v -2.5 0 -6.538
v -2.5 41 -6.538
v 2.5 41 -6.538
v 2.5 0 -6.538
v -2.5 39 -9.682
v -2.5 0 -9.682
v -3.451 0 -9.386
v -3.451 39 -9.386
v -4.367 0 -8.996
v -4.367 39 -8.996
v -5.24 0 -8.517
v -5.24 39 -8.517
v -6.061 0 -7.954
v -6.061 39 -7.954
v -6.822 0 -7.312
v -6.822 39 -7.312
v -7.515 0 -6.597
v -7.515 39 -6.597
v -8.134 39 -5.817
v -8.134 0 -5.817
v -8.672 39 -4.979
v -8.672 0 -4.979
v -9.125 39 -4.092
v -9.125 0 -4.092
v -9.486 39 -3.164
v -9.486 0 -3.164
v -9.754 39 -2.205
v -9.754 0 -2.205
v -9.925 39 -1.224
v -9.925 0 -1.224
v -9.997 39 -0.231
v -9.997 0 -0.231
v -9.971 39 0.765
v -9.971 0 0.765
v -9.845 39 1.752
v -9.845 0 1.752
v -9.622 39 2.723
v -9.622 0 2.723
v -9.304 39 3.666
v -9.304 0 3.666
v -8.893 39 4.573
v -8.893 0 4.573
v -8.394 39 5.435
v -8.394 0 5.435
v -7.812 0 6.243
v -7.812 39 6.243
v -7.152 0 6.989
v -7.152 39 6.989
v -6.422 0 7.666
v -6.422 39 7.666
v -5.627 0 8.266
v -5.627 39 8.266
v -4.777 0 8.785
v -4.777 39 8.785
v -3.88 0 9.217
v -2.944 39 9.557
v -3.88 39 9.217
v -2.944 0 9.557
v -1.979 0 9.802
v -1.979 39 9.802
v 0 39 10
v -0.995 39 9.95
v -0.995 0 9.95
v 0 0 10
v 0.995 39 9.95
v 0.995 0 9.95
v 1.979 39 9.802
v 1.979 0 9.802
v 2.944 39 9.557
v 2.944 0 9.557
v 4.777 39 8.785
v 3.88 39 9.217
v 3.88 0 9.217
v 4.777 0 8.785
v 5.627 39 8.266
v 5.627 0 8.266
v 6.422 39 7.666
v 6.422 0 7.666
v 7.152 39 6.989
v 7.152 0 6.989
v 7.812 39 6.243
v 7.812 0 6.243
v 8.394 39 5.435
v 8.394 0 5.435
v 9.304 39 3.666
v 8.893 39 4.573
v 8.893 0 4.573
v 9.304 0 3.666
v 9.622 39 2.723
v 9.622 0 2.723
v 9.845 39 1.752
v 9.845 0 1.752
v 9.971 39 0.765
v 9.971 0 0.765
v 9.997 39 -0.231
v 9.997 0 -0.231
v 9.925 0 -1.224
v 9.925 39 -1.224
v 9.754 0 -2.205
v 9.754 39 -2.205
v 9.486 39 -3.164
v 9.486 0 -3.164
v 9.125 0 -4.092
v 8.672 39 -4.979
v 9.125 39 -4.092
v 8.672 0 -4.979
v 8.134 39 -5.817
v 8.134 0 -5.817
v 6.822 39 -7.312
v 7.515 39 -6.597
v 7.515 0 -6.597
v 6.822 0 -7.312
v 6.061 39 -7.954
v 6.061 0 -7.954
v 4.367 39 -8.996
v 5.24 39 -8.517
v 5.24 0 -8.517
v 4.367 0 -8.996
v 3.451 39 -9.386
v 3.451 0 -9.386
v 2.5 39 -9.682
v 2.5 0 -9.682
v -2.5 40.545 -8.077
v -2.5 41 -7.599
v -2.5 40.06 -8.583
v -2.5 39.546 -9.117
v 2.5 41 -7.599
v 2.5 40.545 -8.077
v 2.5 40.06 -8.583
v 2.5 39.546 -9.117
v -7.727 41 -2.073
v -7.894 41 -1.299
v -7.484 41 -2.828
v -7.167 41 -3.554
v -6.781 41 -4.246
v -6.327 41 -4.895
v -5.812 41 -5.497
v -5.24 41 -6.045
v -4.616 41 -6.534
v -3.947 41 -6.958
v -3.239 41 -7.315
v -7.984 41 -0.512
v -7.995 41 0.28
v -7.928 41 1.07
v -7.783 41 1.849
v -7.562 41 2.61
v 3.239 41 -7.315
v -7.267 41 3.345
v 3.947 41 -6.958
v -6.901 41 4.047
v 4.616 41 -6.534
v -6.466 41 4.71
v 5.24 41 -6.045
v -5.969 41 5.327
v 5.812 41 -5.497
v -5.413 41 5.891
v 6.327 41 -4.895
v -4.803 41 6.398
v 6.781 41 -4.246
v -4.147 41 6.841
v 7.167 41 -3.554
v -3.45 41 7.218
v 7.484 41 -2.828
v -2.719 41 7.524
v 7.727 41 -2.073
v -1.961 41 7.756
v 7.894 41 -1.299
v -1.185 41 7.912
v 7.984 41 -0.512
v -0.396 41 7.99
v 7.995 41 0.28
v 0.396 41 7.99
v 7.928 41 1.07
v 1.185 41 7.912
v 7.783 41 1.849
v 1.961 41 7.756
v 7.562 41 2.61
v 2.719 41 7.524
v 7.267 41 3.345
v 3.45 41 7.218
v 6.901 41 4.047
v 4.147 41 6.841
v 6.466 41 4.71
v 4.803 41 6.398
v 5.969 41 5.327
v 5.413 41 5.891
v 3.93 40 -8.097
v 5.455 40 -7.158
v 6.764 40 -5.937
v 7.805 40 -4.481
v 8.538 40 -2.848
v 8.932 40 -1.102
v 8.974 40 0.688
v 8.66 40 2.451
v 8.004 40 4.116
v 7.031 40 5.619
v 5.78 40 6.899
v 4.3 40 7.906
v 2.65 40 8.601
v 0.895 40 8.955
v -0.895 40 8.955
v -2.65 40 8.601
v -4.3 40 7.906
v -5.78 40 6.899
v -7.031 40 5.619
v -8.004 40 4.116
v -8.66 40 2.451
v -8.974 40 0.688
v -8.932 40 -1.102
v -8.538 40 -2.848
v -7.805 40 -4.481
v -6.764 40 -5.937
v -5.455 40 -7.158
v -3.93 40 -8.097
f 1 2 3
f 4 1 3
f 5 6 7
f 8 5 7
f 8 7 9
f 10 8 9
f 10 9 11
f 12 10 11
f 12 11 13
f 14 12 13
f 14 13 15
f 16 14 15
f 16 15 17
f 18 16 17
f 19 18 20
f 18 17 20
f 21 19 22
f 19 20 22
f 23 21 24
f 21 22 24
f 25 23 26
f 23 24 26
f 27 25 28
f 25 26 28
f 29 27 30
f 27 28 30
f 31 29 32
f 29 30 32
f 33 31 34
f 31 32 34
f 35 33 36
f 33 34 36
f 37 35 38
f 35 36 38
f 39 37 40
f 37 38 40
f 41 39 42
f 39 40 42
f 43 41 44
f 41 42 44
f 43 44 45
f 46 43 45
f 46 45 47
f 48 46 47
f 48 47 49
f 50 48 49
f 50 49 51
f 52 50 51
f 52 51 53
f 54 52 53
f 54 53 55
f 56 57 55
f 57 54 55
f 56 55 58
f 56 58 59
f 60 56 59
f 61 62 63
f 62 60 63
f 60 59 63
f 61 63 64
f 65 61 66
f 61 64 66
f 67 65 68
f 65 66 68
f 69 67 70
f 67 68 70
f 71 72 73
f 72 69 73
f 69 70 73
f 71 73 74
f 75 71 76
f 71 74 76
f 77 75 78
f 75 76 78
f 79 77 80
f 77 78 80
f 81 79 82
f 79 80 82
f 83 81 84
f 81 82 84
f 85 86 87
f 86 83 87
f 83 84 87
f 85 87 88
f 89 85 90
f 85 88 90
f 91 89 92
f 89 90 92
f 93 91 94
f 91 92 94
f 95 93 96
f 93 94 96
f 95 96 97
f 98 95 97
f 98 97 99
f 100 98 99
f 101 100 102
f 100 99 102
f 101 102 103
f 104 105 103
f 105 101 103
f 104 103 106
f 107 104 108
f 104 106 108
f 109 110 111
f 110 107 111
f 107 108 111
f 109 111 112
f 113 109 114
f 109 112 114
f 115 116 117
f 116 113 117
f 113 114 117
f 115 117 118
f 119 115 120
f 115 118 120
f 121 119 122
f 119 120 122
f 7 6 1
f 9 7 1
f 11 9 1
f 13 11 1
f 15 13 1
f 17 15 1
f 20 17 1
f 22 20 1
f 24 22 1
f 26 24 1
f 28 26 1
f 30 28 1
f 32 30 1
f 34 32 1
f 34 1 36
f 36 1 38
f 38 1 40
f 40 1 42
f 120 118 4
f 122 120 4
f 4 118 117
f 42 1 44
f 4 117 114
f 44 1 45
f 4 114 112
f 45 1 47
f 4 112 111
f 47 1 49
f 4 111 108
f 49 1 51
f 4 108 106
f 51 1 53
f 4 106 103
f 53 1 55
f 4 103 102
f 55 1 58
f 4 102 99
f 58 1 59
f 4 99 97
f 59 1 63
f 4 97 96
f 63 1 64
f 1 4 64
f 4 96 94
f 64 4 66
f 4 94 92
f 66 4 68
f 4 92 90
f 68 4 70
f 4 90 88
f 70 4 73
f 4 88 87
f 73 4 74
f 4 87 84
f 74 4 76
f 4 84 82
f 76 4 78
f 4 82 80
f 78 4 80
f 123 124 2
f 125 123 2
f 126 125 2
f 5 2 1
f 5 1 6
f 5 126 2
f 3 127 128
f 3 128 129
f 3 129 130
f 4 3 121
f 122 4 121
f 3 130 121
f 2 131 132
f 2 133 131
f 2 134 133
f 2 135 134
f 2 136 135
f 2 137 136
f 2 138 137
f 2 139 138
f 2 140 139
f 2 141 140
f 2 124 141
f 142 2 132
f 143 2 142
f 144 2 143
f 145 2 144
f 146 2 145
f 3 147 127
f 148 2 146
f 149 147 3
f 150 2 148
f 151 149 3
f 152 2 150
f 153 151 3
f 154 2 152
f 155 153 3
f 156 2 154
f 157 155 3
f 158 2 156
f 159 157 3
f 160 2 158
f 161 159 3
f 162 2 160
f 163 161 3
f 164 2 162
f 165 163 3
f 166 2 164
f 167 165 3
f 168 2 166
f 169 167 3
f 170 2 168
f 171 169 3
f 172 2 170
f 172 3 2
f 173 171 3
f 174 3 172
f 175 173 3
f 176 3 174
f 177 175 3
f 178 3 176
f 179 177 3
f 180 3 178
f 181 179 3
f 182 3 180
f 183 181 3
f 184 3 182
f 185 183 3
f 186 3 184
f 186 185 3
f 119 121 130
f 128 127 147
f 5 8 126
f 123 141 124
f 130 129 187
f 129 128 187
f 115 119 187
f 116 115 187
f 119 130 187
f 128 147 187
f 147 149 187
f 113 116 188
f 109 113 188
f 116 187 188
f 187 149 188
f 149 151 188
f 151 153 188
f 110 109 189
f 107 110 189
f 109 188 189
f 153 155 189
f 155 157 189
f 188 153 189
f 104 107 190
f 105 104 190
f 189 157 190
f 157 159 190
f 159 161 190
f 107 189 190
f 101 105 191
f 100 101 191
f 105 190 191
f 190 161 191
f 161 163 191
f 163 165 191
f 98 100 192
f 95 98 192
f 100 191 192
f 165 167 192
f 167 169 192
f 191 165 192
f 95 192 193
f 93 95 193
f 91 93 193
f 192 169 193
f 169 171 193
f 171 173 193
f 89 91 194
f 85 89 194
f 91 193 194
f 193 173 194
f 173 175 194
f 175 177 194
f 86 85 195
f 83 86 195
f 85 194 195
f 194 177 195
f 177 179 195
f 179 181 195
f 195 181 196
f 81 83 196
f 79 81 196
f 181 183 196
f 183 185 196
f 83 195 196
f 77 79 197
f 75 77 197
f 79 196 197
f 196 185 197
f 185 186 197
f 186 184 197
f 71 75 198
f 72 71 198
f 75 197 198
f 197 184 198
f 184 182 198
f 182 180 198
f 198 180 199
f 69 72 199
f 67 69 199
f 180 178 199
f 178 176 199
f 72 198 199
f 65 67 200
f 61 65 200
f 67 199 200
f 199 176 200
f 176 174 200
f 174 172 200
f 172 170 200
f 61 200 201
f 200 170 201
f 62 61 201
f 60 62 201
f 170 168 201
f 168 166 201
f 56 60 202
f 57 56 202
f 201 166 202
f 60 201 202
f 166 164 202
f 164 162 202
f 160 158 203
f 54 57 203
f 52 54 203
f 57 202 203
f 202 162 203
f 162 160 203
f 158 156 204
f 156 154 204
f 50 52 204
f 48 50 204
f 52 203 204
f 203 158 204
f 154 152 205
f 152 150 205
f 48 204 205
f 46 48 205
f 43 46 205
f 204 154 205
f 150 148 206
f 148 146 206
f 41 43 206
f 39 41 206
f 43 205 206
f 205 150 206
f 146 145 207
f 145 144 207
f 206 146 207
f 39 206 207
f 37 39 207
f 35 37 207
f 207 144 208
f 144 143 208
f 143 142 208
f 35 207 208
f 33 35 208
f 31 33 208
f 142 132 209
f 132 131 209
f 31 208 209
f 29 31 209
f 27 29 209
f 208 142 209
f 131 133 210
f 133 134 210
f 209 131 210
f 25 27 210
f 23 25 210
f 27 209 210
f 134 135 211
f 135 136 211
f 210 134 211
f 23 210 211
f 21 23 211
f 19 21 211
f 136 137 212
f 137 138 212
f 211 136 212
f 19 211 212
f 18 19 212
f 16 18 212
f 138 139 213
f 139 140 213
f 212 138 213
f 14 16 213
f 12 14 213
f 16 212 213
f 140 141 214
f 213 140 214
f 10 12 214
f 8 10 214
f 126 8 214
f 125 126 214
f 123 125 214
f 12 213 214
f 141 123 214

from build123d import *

# Parameters (mm, degrees)
SKETCH_1_R          = 10
EXTRUDE_1_DEPTH     = 41
SKETCH_2_W          = 5
SKETCH_2_H          = 3.914156893
CUT_EXTRUDE_1_DEPTH = 48
CHAMFER_1_SIZE      = 2


with BuildPart() as part:
    # Эскиз1 → Бобышка-Вытянуть1 (new body)
    with BuildSketch(Plane(origin=(0, 0, 0), x_dir=(1, 0, 0), z_dir=(0, 1, 0))):
        with Locations(Location((0, 0, 0), (0, 0, 270))):
            Circle(SKETCH_1_R)
    extrude(amount=EXTRUDE_1_DEPTH)

    # Эскиз2 → Вырез-Вытянуть1 (cut)
    with BuildSketch(Plane(origin=(0, 41, 0), x_dir=(1, 0, 0), z_dir=(0, 1, 0))):
        with Locations((0, 8.495426862)):
            Rectangle(SKETCH_2_W, SKETCH_2_H)
    extrude(amount=-CUT_EXTRUDE_1_DEPTH, mode=Mode.SUBTRACT)

    # Фаска1
    chamfer_1_edges = [part.edges().sort_by_distance(p)[0] for p in [
        (0, 41, 10),
    ]]
    chamfer(chamfer_1_edges, length=CHAMFER_1_SIZE)


solid = part.part
